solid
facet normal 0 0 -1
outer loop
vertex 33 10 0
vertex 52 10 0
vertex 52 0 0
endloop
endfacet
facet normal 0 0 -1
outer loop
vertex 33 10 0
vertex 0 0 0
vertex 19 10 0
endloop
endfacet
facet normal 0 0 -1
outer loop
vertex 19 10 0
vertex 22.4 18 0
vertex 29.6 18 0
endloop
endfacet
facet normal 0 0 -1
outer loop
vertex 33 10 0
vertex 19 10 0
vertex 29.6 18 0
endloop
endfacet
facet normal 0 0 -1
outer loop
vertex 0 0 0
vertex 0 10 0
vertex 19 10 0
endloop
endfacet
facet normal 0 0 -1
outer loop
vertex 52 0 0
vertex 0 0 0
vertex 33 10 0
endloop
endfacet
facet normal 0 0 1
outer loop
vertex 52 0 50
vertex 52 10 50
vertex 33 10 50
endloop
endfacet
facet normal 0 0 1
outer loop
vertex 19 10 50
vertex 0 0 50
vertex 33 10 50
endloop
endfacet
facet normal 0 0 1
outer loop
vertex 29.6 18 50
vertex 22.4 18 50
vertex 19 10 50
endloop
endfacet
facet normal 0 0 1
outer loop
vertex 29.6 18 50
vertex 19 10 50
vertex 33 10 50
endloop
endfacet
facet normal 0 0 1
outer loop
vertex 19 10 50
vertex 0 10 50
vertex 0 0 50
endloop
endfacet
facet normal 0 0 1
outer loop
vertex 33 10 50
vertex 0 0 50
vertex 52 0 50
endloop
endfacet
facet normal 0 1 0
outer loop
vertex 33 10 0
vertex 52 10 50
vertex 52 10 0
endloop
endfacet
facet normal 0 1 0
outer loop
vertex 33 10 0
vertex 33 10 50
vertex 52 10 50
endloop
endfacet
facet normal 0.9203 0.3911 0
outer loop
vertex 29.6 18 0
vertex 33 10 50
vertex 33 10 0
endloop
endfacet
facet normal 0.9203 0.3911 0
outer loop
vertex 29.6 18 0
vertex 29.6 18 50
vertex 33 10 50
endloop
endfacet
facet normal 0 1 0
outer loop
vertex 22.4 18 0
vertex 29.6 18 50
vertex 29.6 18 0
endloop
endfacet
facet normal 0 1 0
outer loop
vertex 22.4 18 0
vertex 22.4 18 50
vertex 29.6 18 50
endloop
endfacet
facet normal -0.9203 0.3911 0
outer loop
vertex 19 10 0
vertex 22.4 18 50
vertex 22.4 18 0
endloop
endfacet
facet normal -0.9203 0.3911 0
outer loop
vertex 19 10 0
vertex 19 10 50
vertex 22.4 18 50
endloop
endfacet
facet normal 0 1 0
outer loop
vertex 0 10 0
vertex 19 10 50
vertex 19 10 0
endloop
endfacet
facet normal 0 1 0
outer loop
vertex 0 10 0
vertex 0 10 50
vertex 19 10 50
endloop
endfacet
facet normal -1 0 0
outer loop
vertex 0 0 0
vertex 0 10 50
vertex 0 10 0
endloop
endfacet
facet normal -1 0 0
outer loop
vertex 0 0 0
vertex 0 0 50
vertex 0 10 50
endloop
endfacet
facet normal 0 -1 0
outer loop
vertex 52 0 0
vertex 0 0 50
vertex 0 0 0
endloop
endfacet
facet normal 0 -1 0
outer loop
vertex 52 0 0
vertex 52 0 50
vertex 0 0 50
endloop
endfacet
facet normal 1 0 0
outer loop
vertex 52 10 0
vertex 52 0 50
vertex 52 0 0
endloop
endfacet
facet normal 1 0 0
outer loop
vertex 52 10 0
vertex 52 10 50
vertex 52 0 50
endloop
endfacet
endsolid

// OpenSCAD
$fn = 32;

// ----------------------------------------------------------------------
// V guide rail: dovetail, 52 mm wide
// ----------------------------------------------------------------------

// --- parameters (mm) ---
rail_w = 52;              // rail width, X
base_t = 10;              // base plate thickness
v_depth = 8;              // V feature depth / height
v_half_w = 7;             // half width of the V at the base face
plate_t = 50;             // rail length, Z (the extrusion height)
top_half_w = 3.6;         // half width at the dovetail top

dovetail_base = 2 * v_half_w;  // dovetail width at the base
dovetail_top = 2 * top_half_w;  // dovetail width at the top

profile = [[0, 0], [52, 0], [52, 10], [33, 10], [29.6, 18], [22.4, 18], [19, 10], [0, 10]];  // primary outline, 8 points, counter clockwise

// --- the one profile operation ---
linear_extrude(height = plate_t) polygon(points = profile);
